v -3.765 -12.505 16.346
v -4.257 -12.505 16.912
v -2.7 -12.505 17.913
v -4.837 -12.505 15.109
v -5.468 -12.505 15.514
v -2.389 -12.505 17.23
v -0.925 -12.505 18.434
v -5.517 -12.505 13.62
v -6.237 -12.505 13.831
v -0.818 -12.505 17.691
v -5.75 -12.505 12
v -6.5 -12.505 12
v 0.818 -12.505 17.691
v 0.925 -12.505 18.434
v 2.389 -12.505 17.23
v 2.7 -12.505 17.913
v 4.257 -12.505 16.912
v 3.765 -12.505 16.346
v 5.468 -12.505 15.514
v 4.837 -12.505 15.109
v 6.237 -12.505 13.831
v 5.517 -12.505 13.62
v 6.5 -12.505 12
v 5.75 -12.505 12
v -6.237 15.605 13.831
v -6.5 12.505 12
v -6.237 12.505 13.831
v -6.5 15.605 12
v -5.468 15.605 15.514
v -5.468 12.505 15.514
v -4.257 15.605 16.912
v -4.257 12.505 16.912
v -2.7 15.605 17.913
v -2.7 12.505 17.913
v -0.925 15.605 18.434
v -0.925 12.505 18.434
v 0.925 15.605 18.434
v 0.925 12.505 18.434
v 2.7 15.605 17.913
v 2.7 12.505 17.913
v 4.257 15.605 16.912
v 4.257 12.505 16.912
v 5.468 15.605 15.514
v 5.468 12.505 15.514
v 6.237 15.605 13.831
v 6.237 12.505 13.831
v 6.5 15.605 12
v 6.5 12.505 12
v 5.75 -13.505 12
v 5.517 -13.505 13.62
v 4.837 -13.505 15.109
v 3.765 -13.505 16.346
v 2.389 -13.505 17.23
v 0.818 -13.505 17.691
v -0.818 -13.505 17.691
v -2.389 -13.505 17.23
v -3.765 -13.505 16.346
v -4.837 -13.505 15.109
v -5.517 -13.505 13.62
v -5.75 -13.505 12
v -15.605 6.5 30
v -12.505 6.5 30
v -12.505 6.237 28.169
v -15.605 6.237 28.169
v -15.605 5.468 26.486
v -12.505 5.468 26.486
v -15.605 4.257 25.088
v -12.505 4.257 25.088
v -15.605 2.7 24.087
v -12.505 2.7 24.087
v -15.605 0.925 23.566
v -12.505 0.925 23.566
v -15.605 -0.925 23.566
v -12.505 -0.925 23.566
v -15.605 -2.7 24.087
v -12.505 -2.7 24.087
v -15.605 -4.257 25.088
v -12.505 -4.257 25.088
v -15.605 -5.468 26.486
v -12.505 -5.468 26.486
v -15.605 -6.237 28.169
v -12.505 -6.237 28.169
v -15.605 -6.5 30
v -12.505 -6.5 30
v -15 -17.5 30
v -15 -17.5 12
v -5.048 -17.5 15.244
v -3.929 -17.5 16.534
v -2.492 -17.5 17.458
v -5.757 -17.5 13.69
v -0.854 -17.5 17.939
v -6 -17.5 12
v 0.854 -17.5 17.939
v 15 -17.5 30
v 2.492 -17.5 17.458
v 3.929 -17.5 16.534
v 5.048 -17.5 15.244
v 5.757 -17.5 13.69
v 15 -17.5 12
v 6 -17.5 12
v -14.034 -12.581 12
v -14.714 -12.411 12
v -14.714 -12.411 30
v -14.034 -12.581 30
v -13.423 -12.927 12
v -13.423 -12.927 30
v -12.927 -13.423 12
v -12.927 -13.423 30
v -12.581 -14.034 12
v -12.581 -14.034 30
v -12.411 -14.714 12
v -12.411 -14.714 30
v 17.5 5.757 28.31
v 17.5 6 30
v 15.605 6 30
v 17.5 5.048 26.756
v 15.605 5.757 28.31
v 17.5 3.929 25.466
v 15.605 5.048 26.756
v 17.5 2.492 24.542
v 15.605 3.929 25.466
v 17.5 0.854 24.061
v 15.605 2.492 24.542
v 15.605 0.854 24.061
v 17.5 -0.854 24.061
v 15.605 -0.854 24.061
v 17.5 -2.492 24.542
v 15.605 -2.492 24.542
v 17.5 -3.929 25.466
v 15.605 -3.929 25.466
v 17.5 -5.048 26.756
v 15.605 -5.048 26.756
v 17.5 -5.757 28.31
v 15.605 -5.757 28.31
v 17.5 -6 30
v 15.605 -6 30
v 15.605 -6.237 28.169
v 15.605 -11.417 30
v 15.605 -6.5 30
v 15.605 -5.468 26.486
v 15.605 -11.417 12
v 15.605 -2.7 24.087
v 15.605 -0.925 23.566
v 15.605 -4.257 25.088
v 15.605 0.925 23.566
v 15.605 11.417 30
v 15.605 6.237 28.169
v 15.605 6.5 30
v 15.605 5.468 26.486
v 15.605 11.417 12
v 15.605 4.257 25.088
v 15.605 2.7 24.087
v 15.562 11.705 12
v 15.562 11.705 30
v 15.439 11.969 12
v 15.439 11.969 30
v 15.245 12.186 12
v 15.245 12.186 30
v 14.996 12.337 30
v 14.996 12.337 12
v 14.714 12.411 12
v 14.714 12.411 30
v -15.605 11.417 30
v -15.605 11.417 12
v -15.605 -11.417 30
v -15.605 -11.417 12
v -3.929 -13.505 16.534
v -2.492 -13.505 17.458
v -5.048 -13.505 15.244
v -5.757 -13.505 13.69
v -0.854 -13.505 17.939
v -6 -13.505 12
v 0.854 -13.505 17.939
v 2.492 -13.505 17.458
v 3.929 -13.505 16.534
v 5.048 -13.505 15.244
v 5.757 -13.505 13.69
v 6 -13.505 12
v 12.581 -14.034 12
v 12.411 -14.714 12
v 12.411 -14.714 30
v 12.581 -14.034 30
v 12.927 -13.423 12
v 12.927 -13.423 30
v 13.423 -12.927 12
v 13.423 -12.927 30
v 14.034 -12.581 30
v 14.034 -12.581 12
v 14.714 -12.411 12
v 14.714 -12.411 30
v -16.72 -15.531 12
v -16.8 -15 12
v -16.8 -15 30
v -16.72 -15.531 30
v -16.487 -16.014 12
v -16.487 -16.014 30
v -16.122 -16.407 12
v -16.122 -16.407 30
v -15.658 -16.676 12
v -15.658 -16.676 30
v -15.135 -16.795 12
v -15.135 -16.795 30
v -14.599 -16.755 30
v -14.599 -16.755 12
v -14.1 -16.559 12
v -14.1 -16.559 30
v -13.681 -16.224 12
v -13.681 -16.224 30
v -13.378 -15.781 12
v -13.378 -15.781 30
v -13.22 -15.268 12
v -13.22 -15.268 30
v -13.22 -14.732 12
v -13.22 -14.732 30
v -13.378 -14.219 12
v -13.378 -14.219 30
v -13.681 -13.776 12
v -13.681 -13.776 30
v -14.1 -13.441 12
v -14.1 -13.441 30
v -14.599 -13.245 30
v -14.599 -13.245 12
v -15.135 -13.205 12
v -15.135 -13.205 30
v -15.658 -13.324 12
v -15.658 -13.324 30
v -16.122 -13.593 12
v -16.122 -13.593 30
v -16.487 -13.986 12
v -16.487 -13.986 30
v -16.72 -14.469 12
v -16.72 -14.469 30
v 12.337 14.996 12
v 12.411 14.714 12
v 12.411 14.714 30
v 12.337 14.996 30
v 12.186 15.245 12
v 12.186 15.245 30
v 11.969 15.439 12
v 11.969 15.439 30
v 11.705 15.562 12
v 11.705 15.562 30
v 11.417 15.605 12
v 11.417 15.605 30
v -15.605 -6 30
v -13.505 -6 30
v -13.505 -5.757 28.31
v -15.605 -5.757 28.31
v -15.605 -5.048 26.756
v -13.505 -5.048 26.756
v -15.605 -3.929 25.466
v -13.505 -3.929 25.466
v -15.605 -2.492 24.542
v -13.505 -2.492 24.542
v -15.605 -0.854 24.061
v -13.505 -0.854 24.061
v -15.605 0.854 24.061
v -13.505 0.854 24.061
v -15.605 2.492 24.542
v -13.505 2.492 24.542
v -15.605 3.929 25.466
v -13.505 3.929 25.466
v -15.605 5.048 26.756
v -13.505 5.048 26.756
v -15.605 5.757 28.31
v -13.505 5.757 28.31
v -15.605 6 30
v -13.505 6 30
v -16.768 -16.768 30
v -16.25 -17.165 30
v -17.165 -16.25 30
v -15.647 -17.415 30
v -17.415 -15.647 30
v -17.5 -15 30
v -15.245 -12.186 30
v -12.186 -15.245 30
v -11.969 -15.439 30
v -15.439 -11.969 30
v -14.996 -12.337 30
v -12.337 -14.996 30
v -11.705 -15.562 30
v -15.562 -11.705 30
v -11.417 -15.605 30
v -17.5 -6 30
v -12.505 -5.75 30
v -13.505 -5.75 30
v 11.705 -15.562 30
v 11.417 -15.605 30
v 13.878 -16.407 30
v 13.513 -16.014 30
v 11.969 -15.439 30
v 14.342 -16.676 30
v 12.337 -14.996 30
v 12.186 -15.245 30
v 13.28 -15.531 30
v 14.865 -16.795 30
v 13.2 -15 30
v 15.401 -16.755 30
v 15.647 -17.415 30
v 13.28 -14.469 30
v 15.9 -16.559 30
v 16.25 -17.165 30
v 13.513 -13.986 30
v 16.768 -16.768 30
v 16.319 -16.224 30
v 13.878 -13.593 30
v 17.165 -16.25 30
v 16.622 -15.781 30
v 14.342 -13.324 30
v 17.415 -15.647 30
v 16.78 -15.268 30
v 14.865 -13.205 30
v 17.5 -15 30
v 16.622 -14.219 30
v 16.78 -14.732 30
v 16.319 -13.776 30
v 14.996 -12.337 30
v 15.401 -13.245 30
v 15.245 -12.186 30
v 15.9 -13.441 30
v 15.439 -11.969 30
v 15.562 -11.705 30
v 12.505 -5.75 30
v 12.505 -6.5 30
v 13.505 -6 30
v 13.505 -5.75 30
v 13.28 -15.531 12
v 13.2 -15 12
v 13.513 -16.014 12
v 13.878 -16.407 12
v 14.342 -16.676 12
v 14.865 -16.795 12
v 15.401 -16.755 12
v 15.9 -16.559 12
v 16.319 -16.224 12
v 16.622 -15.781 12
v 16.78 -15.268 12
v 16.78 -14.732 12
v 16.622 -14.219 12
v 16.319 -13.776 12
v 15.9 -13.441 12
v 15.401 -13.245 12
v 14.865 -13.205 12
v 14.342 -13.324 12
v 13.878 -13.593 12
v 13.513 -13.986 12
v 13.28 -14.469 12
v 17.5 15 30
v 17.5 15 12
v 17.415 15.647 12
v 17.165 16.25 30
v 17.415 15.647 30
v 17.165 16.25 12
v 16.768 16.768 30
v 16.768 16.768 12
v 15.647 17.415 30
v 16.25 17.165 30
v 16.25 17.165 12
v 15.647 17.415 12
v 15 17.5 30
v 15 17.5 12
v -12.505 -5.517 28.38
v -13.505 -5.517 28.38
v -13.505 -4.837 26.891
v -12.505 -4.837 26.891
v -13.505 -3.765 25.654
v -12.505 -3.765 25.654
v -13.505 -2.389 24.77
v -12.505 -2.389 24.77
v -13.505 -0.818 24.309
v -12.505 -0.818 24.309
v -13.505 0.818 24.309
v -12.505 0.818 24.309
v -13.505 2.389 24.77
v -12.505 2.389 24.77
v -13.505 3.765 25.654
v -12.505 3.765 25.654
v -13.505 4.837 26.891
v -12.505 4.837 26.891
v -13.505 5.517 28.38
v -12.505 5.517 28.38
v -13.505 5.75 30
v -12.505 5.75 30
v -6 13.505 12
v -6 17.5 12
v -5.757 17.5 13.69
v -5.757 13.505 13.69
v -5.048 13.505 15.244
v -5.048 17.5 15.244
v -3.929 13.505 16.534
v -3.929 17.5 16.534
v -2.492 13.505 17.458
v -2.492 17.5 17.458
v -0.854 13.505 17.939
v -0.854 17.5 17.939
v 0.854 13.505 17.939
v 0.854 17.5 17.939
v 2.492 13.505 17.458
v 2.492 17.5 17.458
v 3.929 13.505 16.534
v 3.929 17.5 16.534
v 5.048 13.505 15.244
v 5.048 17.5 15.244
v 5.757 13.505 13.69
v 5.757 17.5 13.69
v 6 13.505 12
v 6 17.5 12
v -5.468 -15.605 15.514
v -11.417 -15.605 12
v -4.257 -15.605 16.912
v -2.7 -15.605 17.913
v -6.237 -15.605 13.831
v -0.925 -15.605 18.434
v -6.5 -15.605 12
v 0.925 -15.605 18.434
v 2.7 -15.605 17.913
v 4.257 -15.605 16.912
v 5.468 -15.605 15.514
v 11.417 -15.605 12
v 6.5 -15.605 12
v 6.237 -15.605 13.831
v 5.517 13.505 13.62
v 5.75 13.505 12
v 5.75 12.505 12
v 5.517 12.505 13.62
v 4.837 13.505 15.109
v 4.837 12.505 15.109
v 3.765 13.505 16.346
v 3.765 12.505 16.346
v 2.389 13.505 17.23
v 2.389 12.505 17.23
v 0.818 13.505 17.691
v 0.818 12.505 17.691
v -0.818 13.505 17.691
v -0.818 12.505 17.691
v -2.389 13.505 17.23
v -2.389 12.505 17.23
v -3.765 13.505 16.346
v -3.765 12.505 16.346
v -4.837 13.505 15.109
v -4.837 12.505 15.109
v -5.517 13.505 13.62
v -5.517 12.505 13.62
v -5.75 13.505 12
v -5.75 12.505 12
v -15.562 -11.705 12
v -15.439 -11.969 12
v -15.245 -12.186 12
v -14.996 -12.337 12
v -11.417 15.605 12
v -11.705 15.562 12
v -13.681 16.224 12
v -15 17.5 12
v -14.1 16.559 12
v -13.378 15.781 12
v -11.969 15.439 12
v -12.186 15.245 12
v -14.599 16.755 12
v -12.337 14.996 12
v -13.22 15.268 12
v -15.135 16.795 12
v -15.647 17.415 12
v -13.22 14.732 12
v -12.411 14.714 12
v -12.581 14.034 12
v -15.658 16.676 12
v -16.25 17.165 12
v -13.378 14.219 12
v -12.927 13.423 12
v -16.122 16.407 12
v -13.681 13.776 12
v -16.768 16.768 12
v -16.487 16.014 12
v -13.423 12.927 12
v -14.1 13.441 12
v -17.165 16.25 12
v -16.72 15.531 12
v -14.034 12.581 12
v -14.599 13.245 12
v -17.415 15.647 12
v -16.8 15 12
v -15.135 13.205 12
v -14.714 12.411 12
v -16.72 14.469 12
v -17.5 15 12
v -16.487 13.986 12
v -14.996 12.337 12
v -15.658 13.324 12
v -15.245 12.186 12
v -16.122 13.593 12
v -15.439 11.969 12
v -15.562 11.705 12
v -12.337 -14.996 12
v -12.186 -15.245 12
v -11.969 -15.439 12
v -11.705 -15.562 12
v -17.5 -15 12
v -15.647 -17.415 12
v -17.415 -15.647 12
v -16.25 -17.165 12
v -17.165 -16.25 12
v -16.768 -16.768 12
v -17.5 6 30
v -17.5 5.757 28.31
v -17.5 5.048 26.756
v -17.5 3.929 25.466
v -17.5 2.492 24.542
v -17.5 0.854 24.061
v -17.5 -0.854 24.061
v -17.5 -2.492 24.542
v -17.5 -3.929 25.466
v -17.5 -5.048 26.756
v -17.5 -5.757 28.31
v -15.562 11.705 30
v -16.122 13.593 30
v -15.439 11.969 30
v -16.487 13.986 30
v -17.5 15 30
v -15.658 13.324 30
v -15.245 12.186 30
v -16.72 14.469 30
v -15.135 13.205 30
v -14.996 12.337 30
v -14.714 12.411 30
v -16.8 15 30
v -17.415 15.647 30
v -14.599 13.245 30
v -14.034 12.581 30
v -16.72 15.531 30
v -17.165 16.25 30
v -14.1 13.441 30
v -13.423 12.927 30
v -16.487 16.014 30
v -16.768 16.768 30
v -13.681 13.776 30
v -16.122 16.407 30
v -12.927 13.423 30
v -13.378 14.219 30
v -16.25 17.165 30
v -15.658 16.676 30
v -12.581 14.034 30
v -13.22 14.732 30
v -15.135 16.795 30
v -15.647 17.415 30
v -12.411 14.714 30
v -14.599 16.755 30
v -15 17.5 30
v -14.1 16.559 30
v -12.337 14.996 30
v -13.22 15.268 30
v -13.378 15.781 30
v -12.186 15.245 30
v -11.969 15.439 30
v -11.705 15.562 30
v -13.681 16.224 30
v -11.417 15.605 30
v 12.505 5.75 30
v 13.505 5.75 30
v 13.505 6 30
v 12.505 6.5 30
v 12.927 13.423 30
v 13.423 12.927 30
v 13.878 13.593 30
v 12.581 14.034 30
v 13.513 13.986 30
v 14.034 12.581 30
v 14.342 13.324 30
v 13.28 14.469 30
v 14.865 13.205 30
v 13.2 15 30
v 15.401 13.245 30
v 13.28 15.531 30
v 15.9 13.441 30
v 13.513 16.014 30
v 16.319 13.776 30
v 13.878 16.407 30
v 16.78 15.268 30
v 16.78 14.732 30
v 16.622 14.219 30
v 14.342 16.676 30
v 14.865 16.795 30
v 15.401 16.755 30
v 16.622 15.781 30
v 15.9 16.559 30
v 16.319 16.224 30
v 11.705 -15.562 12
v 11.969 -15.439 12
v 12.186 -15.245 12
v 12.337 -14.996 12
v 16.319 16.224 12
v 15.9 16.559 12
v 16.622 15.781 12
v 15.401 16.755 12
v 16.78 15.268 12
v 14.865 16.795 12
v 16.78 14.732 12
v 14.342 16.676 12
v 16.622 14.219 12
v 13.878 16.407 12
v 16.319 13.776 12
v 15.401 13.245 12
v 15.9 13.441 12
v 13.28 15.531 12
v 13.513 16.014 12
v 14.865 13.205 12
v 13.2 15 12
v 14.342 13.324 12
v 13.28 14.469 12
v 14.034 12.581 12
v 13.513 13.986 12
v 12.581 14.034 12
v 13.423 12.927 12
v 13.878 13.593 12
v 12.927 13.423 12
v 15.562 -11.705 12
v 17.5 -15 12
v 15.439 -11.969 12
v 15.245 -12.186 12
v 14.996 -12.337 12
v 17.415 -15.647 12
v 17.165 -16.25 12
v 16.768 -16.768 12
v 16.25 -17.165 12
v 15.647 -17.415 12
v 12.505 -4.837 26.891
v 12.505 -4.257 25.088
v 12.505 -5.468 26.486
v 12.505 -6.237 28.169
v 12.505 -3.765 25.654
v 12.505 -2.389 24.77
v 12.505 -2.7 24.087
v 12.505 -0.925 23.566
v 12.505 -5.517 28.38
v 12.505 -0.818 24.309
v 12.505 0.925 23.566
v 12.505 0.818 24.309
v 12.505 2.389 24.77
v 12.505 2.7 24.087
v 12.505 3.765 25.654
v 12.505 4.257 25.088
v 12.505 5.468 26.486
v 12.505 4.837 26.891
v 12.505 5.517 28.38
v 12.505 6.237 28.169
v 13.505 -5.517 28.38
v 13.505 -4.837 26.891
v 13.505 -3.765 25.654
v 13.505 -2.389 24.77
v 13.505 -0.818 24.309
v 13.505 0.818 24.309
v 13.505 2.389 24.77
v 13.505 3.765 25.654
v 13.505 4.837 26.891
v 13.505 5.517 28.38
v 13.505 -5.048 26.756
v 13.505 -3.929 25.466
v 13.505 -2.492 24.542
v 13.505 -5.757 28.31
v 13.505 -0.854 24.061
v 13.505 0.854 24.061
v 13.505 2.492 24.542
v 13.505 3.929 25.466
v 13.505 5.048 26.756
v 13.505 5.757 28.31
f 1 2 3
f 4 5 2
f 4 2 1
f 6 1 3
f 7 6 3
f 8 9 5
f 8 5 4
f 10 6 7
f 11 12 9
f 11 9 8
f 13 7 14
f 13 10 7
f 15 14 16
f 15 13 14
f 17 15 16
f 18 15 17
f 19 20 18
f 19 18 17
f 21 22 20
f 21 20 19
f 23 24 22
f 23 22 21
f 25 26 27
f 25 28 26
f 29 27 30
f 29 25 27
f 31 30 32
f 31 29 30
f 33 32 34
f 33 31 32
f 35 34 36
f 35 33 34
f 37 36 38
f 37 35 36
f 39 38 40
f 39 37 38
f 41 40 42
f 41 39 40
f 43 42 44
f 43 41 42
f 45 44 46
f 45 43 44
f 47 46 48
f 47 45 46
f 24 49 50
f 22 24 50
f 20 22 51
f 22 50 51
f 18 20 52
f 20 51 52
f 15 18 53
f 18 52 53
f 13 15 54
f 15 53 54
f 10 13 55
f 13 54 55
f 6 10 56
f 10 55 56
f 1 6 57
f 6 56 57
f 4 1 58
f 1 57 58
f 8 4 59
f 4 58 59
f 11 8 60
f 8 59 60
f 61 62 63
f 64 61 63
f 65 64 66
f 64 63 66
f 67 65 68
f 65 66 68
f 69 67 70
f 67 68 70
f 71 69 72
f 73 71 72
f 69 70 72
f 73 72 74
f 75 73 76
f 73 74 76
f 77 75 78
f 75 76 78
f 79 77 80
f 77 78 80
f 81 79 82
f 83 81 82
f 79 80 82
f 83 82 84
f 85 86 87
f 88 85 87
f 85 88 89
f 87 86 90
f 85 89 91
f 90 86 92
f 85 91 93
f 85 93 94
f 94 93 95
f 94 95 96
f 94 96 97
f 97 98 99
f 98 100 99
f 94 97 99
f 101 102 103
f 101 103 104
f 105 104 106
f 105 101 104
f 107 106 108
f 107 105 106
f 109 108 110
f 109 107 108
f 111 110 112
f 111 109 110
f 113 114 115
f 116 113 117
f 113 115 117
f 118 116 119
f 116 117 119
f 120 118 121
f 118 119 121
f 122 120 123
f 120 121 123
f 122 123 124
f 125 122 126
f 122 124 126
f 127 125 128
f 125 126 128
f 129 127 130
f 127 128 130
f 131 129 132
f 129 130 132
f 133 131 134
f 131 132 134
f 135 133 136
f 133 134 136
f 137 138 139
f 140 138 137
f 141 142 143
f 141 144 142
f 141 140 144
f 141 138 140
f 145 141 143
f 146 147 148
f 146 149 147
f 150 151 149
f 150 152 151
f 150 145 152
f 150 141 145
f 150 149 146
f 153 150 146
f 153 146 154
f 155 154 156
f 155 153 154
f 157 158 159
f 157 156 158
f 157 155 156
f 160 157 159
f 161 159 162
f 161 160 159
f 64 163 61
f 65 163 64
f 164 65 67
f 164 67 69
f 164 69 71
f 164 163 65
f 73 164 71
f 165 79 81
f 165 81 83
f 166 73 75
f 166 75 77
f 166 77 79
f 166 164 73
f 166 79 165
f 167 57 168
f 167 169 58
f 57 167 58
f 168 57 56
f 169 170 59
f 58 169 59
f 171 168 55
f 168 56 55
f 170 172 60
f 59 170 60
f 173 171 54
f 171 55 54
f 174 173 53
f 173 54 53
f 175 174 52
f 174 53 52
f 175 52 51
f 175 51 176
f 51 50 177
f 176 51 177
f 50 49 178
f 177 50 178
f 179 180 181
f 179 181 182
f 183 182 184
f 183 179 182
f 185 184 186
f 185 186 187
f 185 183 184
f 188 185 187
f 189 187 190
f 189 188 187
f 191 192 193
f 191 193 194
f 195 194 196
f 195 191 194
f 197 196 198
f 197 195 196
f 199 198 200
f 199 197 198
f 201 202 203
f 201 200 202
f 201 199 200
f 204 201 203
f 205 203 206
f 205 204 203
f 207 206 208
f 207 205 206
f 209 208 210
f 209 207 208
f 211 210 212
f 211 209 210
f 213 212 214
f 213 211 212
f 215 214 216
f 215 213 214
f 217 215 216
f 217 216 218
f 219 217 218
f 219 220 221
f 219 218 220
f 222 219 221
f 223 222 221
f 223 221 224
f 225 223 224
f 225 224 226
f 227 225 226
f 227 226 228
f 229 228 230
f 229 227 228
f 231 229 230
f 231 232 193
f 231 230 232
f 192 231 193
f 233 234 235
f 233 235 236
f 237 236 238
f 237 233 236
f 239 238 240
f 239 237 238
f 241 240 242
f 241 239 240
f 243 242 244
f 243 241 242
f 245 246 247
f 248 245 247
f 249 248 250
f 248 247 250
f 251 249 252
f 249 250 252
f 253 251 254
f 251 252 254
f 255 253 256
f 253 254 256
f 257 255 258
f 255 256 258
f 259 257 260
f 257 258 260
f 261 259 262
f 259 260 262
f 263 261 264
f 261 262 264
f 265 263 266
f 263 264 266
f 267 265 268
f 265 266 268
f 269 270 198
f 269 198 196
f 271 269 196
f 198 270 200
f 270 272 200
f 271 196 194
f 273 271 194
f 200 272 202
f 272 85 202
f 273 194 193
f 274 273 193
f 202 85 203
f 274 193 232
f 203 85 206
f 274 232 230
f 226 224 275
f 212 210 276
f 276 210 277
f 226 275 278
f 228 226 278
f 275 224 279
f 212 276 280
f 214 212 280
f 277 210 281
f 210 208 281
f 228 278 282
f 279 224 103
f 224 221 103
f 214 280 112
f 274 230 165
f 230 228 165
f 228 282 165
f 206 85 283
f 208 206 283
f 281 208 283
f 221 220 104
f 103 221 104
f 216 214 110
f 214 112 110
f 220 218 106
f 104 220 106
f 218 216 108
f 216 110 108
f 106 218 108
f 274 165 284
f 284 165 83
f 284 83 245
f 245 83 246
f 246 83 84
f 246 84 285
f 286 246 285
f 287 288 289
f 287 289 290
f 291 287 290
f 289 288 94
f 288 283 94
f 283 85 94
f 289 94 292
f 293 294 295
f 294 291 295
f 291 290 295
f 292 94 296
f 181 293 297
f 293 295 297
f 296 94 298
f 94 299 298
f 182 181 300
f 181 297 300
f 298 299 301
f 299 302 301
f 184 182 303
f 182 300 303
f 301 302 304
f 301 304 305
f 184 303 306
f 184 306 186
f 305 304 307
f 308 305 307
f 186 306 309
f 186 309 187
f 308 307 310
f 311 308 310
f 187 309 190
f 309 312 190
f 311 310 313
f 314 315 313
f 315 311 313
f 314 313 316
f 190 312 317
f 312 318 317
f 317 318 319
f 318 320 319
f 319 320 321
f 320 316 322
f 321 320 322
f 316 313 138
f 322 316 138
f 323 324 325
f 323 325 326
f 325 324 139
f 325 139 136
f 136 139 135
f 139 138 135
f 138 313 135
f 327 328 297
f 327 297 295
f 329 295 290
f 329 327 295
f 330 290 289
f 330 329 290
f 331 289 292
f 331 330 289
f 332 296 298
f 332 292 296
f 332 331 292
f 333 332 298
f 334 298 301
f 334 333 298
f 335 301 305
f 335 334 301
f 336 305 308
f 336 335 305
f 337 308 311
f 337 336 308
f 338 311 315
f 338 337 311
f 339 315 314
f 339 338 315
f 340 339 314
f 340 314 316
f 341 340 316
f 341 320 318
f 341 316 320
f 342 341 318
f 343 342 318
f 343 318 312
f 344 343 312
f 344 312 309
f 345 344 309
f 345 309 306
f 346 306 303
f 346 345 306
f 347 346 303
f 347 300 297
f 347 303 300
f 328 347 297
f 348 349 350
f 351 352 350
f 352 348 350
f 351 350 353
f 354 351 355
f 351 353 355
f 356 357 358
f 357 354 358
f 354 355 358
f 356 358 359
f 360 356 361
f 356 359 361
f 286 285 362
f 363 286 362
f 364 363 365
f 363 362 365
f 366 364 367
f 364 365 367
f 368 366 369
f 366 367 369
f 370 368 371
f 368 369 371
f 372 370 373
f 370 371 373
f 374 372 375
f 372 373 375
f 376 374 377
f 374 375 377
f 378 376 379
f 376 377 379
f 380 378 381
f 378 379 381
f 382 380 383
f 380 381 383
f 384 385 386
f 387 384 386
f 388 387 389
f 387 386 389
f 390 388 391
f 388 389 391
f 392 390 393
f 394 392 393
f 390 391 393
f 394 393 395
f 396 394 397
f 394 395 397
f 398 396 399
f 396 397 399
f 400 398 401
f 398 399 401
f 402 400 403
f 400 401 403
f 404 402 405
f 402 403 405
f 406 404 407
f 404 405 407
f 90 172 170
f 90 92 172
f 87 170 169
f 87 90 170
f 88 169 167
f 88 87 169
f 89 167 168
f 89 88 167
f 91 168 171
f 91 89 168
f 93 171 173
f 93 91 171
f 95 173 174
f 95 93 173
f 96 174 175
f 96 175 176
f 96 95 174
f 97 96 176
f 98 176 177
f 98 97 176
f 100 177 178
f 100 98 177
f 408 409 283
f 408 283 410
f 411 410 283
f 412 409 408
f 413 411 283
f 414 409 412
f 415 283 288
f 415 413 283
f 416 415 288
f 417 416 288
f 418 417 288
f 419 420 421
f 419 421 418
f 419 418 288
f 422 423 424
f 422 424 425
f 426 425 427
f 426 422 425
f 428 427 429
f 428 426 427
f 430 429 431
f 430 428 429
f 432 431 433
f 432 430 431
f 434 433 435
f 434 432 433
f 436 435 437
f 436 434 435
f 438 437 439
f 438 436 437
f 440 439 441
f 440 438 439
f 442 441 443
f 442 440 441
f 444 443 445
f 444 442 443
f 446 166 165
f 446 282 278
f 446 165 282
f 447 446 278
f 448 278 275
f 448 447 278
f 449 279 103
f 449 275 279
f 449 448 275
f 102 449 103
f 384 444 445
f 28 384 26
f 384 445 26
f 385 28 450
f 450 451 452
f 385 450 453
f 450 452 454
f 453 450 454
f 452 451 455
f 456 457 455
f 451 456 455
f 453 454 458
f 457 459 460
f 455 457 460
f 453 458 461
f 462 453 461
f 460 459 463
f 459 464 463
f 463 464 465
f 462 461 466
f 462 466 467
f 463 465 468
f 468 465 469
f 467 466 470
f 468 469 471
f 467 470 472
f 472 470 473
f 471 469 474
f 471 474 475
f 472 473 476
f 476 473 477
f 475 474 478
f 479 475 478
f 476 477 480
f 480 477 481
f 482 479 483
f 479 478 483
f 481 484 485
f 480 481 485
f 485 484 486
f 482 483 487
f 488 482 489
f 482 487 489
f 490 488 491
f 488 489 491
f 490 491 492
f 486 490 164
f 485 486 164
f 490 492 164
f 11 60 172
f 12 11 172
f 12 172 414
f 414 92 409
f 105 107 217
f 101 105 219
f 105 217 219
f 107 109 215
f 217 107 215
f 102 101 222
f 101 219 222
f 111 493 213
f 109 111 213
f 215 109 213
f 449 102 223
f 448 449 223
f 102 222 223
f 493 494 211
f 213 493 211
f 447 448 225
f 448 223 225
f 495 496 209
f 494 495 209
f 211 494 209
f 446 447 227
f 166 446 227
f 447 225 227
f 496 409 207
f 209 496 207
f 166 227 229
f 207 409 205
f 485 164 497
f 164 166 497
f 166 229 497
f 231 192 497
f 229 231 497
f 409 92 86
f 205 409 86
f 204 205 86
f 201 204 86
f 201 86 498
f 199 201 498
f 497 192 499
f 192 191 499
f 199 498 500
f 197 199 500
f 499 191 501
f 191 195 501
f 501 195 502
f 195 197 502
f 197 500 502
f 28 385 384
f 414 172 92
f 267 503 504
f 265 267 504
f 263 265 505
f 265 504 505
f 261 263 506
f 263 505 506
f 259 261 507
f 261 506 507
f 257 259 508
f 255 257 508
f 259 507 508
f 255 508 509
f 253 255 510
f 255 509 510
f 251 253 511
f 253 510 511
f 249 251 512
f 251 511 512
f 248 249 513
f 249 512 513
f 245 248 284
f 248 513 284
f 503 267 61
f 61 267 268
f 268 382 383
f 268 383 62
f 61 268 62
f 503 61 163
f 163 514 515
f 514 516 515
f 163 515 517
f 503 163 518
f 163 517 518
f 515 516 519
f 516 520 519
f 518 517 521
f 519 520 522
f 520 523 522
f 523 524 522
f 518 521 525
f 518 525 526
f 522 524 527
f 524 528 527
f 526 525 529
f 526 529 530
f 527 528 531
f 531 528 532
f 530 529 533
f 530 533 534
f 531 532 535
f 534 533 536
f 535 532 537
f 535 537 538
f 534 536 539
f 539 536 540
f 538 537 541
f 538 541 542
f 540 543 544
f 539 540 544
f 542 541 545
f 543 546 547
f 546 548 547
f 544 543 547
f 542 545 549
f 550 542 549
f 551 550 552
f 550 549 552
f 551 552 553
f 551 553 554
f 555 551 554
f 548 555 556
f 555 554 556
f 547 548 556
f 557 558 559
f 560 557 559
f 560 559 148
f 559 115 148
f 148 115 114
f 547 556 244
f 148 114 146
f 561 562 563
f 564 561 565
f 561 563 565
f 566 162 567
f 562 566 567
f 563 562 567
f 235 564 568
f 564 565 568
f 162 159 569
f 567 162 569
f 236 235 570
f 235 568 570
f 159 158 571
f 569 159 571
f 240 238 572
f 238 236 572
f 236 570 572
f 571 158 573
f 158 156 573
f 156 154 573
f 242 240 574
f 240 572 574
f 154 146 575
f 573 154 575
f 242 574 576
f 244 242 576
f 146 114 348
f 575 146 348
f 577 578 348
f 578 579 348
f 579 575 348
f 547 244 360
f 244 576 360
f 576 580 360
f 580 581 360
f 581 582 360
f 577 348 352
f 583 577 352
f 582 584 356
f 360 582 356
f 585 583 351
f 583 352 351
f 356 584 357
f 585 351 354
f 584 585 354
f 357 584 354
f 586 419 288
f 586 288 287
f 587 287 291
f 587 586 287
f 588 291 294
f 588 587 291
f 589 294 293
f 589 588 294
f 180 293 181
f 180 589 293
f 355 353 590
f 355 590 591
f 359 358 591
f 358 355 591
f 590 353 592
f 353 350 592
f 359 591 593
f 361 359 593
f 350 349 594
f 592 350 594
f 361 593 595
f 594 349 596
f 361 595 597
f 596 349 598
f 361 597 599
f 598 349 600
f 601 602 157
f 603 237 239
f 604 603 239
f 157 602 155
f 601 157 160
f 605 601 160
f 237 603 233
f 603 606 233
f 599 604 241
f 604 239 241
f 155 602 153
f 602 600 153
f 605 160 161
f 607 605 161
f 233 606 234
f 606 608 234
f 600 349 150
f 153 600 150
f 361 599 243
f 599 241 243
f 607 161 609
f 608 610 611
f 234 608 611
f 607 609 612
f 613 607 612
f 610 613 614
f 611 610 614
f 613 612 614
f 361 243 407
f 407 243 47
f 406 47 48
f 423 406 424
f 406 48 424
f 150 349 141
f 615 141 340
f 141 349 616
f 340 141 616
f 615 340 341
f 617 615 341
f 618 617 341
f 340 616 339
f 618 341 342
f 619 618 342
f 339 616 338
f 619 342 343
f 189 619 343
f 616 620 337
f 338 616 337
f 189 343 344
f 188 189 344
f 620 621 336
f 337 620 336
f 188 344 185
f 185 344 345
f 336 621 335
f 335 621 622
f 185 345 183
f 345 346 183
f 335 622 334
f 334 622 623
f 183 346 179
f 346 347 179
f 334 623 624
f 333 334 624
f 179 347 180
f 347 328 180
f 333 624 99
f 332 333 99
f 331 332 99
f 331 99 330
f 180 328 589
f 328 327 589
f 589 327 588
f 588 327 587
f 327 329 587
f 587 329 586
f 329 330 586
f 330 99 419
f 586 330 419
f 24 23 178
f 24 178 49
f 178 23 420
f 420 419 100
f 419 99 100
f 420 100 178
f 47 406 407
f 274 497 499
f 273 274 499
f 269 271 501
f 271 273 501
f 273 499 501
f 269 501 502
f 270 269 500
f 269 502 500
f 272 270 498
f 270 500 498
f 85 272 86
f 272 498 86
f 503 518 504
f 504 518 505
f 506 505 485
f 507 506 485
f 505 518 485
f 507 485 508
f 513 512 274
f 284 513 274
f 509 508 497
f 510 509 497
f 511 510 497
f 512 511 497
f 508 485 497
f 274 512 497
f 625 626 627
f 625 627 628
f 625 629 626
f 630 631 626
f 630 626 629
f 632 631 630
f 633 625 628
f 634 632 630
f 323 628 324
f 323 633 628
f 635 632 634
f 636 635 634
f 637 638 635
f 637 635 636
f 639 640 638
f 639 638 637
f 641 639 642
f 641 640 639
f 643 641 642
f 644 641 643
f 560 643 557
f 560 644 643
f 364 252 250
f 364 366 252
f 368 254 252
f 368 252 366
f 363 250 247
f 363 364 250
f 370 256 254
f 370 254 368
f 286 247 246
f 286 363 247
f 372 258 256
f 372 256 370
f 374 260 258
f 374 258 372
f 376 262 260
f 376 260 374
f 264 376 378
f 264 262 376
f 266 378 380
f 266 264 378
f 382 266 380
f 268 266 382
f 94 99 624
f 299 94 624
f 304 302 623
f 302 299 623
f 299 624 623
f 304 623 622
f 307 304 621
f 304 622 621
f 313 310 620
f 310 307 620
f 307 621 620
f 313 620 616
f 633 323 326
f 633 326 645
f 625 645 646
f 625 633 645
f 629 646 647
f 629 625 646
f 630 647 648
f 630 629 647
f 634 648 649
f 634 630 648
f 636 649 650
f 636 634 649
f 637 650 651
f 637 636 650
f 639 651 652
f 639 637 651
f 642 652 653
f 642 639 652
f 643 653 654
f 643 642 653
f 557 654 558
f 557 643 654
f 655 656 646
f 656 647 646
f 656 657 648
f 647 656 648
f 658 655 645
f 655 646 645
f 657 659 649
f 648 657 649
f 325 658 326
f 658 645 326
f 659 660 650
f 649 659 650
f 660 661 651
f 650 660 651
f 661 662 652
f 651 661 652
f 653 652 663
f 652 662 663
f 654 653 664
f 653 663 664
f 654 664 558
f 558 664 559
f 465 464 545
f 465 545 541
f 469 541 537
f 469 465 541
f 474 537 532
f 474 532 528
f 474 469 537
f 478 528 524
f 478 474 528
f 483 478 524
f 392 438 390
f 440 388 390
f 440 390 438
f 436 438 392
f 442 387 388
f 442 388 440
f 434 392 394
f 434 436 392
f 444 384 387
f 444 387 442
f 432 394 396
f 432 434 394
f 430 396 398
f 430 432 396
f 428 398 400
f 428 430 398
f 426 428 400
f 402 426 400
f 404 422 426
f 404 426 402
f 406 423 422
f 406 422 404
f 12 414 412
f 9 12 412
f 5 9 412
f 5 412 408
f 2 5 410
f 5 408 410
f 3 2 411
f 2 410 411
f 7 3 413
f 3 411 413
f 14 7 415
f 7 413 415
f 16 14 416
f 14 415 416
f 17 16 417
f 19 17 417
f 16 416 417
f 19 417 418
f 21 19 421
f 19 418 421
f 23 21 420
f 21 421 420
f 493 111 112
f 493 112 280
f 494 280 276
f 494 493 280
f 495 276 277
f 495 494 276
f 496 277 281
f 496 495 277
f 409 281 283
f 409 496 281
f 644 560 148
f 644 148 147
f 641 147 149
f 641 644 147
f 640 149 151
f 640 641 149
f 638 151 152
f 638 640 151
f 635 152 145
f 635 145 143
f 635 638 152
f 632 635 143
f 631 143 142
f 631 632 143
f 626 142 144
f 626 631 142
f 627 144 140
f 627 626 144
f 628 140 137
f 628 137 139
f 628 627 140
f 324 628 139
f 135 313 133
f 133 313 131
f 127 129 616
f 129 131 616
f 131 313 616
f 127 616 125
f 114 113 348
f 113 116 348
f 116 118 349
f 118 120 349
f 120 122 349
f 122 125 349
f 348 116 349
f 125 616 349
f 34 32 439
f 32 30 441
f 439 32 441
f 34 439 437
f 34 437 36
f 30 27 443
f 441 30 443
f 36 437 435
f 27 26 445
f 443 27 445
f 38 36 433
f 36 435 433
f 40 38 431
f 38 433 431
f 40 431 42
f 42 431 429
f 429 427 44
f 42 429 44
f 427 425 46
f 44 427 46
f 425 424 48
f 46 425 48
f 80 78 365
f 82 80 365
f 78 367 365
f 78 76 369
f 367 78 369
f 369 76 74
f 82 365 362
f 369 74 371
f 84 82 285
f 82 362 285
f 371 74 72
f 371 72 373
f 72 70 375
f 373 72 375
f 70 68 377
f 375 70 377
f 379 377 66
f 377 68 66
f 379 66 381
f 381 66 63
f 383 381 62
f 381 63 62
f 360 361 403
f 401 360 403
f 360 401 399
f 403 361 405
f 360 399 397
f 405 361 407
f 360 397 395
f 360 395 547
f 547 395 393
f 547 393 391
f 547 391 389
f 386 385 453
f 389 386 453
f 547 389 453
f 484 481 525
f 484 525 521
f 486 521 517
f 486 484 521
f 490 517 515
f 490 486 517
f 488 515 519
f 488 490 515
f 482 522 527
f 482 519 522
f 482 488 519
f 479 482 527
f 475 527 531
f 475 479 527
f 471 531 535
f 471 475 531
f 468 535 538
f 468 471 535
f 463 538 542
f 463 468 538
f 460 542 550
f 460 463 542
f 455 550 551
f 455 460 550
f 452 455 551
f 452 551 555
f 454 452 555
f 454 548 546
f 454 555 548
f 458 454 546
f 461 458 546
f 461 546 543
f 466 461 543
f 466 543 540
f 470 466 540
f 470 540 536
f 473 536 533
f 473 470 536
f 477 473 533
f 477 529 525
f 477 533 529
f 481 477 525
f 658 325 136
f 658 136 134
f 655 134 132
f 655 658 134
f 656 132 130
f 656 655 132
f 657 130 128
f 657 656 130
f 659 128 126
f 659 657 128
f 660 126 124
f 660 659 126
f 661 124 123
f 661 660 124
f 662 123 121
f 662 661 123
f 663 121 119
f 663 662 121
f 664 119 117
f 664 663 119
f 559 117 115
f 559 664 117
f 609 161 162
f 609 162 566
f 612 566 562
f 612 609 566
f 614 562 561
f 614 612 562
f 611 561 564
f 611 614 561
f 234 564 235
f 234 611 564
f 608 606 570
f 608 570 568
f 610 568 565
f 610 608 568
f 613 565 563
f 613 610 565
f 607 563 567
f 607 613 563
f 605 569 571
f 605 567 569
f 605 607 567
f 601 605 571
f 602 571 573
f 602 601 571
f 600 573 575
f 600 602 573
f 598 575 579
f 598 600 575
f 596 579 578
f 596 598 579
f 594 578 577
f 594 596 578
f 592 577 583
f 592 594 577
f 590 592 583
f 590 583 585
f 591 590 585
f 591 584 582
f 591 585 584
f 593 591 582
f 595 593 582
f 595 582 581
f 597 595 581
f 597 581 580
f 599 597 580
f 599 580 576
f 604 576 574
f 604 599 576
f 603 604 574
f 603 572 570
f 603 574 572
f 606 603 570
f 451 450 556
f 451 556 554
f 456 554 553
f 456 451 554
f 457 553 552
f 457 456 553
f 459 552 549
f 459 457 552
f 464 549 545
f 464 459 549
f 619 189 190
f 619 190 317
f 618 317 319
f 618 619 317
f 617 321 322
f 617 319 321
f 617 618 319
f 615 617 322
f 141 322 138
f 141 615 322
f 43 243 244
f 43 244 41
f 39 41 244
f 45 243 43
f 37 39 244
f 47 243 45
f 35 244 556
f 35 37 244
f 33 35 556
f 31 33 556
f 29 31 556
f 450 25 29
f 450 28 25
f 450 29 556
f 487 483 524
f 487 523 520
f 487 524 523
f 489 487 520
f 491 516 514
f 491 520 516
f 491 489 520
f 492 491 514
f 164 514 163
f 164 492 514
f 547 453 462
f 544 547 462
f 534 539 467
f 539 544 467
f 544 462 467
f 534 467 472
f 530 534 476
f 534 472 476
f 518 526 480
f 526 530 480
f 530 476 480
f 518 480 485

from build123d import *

# Parameters (mm, degrees)
SKETCH_1_R          = 1.8000000000000025
SKETCH_1_R_2        = 1.8000000000000043
SKETCH_1_R_3        = 1.8000000000000005
SKETCH_1_R_4        = 1.8000000000000007
EXTRUDE_1_DEPTH     = 42
SKETCH_2_R          = 6.000000000000001
CUT_EXTRUDE_1_DEPTH = 58.404268133998535
SKETCH_3_R          = 6.000000000000002
CUT_EXTRUDE_2_DEPTH = 58.404268133998535
SKETCH_5_W          = 12
SKETCH_5_H          = 15.000000000000005
SKETCH_5_H_2        = 15.000000000000002
CUT_EXTRUDE_3_DEPTH = 58.404268133998535
EXTRUDE_2_DEPTH     = 2.1
EXTRUDE_3_DEPTH     = 1
EXTRUDE_START       = 2.1
EXTRUDE_4_DEPTH     = 2.1
EXTRUDE_START_2     = 1
EXTRUDE_5_DEPTH     = 1


with BuildPart() as part:
    # 草图1 → 凸台-拉伸1 (new body)
    with BuildSketch(Plane(origin=(0, 0, 0), x_dir=(-1, 0, 0), z_dir=(0, 0, 1))):
        with BuildLine():
            Line((-17.499999999999996, 15), (-17.499999999999996, -15.000000000000007))
            ThreePointArc((-17.499999999999996, -15.000000000000007), (-16.767766952966365, -16.767766952966372), (-15, -17.500000000000007))
            Line((-15, -17.500000000000007), (15.000000000000004, -17.500000000000007))
            ThreePointArc((15.000000000000004, -17.500000000000007), (16.76776695296637, -16.767766952966376), (17.5, -15.00000000000001))
            Line((17.5, -15.00000000000001), (17.5, 14.999999999999996))
            ThreePointArc((17.5, 14.999999999999996), (16.76776695296637, 16.76776695296636), (15.000000000000004, 17.499999999999996))
            Line((15.000000000000004, 17.499999999999996), (-15, 17.499999999999996))
            ThreePointArc((-15, 17.499999999999996), (-16.767766952966365, 16.767766952966365), (-17.499999999999996, 15))
        make_face()
        with Locations((-15.000000000000004, -15.00000000000001)):
            Circle(SKETCH_1_R, mode=Mode.SUBTRACT)
        with Locations((15.000000000000004, -15.00000000000001)):
            Circle(SKETCH_1_R_2, mode=Mode.SUBTRACT)
        with Locations((15.000000000000004, 14.999999999999996)):
            Circle(SKETCH_1_R_3, mode=Mode.SUBTRACT)
        with Locations((-15, 15)):
            Circle(SKETCH_1_R_4, mode=Mode.SUBTRACT)
        with BuildLine():
            Line((15.604722413530899, -11.417049414734192), (15.604722413530899, 11.41704941481964))
            ThreePointArc((15.604722413530899, 11.41704941481964), (15.349600753639777, 12.084241863325458), (14.714404940145743, 12.41098197902667))
            ThreePointArc((14.714404940145743, 12.41098197902667), (13.158183898644735, 13.15818233801838), (12.410982220986185, 14.714402746377065))
            ThreePointArc((12.410982220986185, 14.714402746377065), (12.084242685294747, 15.349600017363324), (11.417049414775391, 15.604722413530212))
            Line((11.417049414775391, 15.604722413530212), (-11.417049414778536, 15.604722413530212))
            ThreePointArc((-11.417049414778536, 15.604722413530212), (-12.084241863278942, 15.349600753643644), (-12.410981978984013, 14.714404940159108))
            ThreePointArc((-12.410981978984013, 14.714404940159108), (-13.158182337972896, 13.158183898648431), (-14.714402746337697, 12.41098222098531))
            ThreePointArc((-14.714402746337697, 12.41098222098531), (-15.34960001732269, 12.084242685293246), (-15.604722413489107, 11.41704941477461))
            Line((-15.604722413489107, 11.41704941477461), (-15.604722413489107, -11.417049414779225))
            ThreePointArc((-15.604722413489107, -11.417049414779225), (-15.349600753597985, -12.084241863285039), (-14.714404940103952, -12.410981978986248))
            ThreePointArc((-14.714404940103952, -12.410981978986248), (-13.158183898602942, -13.158182337977962), (-12.410982220944396, -14.714402746336651))
            ThreePointArc((-12.410982220944396, -14.714402746336651), (-12.084242685252958, -15.34960001732291), (-11.417049414733604, -15.604722413489796))
            Line((-11.417049414733604, -15.604722413489796), (11.417049414820326, -15.604722413489796))
            ThreePointArc((11.417049414820326, -15.604722413489796), (12.084241863320731, -15.349600753603227), (12.410981979025802, -14.714404940118692))
            ThreePointArc((12.410981979025802, -14.714404940118692), (13.158182338014687, -13.158183898608014), (14.71440274637949, -12.410982220944893))
            ThreePointArc((14.71440274637949, -12.410982220944893), (15.34960001736448, -12.084242685252828), (15.604722413530899, -11.417049414734192))
        make_face(mode=Mode.SUBTRACT)
    extrude(amount=EXTRUDE_1_DEPTH)

    # 草图2 → 切除-拉伸1 (cut, through all)
    with BuildSketch(Plane(origin=(0, 17.500000000000007, 0), x_dir=(1, 0, 0), z_dir=(0, 1, 0))):
        with Locations(Location((0, -11.999999999999998, 0), (0, 0, 270))):
            Circle(SKETCH_2_R)
    extrude(amount=-CUT_EXTRUDE_1_DEPTH, mode=Mode.SUBTRACT)

    # 草图3 → 切除-拉伸2 (cut, through all)
    with BuildSketch(Plane.ZY.offset(17.5)):
        with Locations((30, 0)):
            Circle(SKETCH_3_R)
    extrude(amount=-CUT_EXTRUDE_2_DEPTH, mode=Mode.SUBTRACT)

    # 草图5 → 切除-拉伸3 (cut, through all)
    with BuildSketch(Plane(origin=(17.499999999999996, 0, 0), x_dir=(0, 0, -1), z_dir=(1, 0, 0))):
        Polygon((-30, -24.974265818952347), (-30, -15), (-42, -15), (-42, 15.000000000000007), (-30, 15.000000000000007), (-30, 23.87950348168345), (-47.41212790980853, 25.238249525472156), (-47.41212790980853, -24.974265818952347), align=None)
        with BuildLine():
            Line((-42, -15), (-30, -15))
            Line((-30, -15), (-30, -6.000000000000003))
            ThreePointArc((-29.999999999999925, -6.000000000000003), (-36, -1.93e-15), (-29.999999999999932, 6.000000000000003))
            Line((-30, 6.000000000000003), (-30, 15.000000000000007))
            Line((-30, 15.000000000000007), (-42, 15.000000000000007))
            Line((-42, 15.000000000000007), (-42, -15))
        make_face()
        with Locations((-6, 7.500000000000003)):
            Rectangle(SKETCH_5_W, SKETCH_5_H)
        Polygon((0, 15.000000000000007), (0, 0), (0, -15), (-12, -15), (-12, -24.974265818952347), (12.116605042765016, -24.974265818952347), (12.116605042765016, 23.87950348168345), (-12, 23.87950348168345), (-12, 15.000000000000007), align=None)
        with Locations((-6, -7.500000000000001)):
            Rectangle(SKETCH_5_W, SKETCH_5_H_2)
    extrude(amount=-CUT_EXTRUDE_3_DEPTH, mode=Mode.SUBTRACT)

    # 草图6 → 凸台-拉伸2 (add)
    with BuildSketch(Plane(origin=(0, 15.604722413489796, 0), x_dir=(-1, 0, 0), z_dir=(0, -1, 0))):
        with BuildLine():
            Line((-6.000000000000001, -11.999999999999998), (-6.500000000000001, -11.999999999999998))
            ThreePointArc((-6.500000000000001, -11.999999999999998), (-1.19e-15, -18.5), (6.500000000000001, -11.999999999999998))
            Line((6.500000000000001, -11.999999999999998), (6.000000000000001, -11.999999999999998))
            ThreePointArc((6.000000000000001, -11.999999999999998), (-1.1e-15, -18), (-6.000000000000001, -11.999999999999998))
        make_face()
    extrude_2 = extrude(amount=EXTRUDE_2_DEPTH)

    # 草图7 → 凸台-拉伸3 (add)
    with BuildSketch(Plane(origin=(0, 13.504722413489795, 0), x_dir=(-1, 0, 0), z_dir=(0, -1, 0))):
        with BuildLine():
            Line((-6.500000000000002, -11.999999999999998), (-5.750000000000001, -11.999999999999998))
            ThreePointArc((-5.750000000000001, -11.999999999999998), (-1.06e-15, -17.75), (5.750000000000001, -11.999999999999998))
            Line((5.750000000000001, -11.999999999999998), (6.500000000000002, -11.999999999999998))
            ThreePointArc((6.500000000000002, -11.999999999999998), (-1.19e-15, -18.5), (-6.500000000000002, -11.999999999999998))
        make_face()
    extrude_3 = extrude(amount=EXTRUDE_3_DEPTH)

    # 镜向1: 凸台-拉伸2, 凸台-拉伸3 across plane
    add(extrude_2.mirror(Plane(origin=(0, 0, 0), x_dir=(0, 0, 1), z_dir=(0, -1, 0))))
    add(extrude_3.mirror(Plane(origin=(0, 0, 0), x_dir=(0, 0, 1), z_dir=(0, -1, 0))))

    # 草图8 → 凸台-拉伸4 (add)
    with BuildSketch(Plane.ZY.offset(-15.604722413489107).offset(EXTRUDE_START)):
        with BuildLine():
            Line((30, -6.500000000000001), (30, -6.000000000000003))
            ThreePointArc((30, -6.000000000000003), (23.999999999999996, 7.3e-16), (30, 6.000000000000003))
            Line((30, 6.000000000000003), (30, 6.500000000000001))
            ThreePointArc((30, 6.500000000000001), (23.5, 8e-16), (30, -6.500000000000001))
        make_face()
    extrude_4 = extrude(amount=-EXTRUDE_4_DEPTH)

    # 草图9 → 凸台-拉伸5 (add)
    with BuildSketch(Plane.ZY.offset(-13.504722413489107).offset(EXTRUDE_START_2)):
        with BuildLine():
            Line((30, -6.500000000000001), (30, -5.750000000000003))
            ThreePointArc((30, -5.750000000000003), (24.249999999999996, 7e-16), (30, 5.750000000000003))
            Line((30, 5.750000000000003), (30, 6.500000000000001))
            ThreePointArc((30, 6.500000000000001), (23.5, 8e-16), (30, -6.500000000000001))
        make_face()
    extrude_5 = extrude(amount=-EXTRUDE_5_DEPTH)

    # 镜向2: 凸台-拉伸4, 凸台-拉伸5 across plane
    add(extrude_4.mirror(Plane.ZY))
    add(extrude_5.mirror(Plane.ZY))


solid = part.part
